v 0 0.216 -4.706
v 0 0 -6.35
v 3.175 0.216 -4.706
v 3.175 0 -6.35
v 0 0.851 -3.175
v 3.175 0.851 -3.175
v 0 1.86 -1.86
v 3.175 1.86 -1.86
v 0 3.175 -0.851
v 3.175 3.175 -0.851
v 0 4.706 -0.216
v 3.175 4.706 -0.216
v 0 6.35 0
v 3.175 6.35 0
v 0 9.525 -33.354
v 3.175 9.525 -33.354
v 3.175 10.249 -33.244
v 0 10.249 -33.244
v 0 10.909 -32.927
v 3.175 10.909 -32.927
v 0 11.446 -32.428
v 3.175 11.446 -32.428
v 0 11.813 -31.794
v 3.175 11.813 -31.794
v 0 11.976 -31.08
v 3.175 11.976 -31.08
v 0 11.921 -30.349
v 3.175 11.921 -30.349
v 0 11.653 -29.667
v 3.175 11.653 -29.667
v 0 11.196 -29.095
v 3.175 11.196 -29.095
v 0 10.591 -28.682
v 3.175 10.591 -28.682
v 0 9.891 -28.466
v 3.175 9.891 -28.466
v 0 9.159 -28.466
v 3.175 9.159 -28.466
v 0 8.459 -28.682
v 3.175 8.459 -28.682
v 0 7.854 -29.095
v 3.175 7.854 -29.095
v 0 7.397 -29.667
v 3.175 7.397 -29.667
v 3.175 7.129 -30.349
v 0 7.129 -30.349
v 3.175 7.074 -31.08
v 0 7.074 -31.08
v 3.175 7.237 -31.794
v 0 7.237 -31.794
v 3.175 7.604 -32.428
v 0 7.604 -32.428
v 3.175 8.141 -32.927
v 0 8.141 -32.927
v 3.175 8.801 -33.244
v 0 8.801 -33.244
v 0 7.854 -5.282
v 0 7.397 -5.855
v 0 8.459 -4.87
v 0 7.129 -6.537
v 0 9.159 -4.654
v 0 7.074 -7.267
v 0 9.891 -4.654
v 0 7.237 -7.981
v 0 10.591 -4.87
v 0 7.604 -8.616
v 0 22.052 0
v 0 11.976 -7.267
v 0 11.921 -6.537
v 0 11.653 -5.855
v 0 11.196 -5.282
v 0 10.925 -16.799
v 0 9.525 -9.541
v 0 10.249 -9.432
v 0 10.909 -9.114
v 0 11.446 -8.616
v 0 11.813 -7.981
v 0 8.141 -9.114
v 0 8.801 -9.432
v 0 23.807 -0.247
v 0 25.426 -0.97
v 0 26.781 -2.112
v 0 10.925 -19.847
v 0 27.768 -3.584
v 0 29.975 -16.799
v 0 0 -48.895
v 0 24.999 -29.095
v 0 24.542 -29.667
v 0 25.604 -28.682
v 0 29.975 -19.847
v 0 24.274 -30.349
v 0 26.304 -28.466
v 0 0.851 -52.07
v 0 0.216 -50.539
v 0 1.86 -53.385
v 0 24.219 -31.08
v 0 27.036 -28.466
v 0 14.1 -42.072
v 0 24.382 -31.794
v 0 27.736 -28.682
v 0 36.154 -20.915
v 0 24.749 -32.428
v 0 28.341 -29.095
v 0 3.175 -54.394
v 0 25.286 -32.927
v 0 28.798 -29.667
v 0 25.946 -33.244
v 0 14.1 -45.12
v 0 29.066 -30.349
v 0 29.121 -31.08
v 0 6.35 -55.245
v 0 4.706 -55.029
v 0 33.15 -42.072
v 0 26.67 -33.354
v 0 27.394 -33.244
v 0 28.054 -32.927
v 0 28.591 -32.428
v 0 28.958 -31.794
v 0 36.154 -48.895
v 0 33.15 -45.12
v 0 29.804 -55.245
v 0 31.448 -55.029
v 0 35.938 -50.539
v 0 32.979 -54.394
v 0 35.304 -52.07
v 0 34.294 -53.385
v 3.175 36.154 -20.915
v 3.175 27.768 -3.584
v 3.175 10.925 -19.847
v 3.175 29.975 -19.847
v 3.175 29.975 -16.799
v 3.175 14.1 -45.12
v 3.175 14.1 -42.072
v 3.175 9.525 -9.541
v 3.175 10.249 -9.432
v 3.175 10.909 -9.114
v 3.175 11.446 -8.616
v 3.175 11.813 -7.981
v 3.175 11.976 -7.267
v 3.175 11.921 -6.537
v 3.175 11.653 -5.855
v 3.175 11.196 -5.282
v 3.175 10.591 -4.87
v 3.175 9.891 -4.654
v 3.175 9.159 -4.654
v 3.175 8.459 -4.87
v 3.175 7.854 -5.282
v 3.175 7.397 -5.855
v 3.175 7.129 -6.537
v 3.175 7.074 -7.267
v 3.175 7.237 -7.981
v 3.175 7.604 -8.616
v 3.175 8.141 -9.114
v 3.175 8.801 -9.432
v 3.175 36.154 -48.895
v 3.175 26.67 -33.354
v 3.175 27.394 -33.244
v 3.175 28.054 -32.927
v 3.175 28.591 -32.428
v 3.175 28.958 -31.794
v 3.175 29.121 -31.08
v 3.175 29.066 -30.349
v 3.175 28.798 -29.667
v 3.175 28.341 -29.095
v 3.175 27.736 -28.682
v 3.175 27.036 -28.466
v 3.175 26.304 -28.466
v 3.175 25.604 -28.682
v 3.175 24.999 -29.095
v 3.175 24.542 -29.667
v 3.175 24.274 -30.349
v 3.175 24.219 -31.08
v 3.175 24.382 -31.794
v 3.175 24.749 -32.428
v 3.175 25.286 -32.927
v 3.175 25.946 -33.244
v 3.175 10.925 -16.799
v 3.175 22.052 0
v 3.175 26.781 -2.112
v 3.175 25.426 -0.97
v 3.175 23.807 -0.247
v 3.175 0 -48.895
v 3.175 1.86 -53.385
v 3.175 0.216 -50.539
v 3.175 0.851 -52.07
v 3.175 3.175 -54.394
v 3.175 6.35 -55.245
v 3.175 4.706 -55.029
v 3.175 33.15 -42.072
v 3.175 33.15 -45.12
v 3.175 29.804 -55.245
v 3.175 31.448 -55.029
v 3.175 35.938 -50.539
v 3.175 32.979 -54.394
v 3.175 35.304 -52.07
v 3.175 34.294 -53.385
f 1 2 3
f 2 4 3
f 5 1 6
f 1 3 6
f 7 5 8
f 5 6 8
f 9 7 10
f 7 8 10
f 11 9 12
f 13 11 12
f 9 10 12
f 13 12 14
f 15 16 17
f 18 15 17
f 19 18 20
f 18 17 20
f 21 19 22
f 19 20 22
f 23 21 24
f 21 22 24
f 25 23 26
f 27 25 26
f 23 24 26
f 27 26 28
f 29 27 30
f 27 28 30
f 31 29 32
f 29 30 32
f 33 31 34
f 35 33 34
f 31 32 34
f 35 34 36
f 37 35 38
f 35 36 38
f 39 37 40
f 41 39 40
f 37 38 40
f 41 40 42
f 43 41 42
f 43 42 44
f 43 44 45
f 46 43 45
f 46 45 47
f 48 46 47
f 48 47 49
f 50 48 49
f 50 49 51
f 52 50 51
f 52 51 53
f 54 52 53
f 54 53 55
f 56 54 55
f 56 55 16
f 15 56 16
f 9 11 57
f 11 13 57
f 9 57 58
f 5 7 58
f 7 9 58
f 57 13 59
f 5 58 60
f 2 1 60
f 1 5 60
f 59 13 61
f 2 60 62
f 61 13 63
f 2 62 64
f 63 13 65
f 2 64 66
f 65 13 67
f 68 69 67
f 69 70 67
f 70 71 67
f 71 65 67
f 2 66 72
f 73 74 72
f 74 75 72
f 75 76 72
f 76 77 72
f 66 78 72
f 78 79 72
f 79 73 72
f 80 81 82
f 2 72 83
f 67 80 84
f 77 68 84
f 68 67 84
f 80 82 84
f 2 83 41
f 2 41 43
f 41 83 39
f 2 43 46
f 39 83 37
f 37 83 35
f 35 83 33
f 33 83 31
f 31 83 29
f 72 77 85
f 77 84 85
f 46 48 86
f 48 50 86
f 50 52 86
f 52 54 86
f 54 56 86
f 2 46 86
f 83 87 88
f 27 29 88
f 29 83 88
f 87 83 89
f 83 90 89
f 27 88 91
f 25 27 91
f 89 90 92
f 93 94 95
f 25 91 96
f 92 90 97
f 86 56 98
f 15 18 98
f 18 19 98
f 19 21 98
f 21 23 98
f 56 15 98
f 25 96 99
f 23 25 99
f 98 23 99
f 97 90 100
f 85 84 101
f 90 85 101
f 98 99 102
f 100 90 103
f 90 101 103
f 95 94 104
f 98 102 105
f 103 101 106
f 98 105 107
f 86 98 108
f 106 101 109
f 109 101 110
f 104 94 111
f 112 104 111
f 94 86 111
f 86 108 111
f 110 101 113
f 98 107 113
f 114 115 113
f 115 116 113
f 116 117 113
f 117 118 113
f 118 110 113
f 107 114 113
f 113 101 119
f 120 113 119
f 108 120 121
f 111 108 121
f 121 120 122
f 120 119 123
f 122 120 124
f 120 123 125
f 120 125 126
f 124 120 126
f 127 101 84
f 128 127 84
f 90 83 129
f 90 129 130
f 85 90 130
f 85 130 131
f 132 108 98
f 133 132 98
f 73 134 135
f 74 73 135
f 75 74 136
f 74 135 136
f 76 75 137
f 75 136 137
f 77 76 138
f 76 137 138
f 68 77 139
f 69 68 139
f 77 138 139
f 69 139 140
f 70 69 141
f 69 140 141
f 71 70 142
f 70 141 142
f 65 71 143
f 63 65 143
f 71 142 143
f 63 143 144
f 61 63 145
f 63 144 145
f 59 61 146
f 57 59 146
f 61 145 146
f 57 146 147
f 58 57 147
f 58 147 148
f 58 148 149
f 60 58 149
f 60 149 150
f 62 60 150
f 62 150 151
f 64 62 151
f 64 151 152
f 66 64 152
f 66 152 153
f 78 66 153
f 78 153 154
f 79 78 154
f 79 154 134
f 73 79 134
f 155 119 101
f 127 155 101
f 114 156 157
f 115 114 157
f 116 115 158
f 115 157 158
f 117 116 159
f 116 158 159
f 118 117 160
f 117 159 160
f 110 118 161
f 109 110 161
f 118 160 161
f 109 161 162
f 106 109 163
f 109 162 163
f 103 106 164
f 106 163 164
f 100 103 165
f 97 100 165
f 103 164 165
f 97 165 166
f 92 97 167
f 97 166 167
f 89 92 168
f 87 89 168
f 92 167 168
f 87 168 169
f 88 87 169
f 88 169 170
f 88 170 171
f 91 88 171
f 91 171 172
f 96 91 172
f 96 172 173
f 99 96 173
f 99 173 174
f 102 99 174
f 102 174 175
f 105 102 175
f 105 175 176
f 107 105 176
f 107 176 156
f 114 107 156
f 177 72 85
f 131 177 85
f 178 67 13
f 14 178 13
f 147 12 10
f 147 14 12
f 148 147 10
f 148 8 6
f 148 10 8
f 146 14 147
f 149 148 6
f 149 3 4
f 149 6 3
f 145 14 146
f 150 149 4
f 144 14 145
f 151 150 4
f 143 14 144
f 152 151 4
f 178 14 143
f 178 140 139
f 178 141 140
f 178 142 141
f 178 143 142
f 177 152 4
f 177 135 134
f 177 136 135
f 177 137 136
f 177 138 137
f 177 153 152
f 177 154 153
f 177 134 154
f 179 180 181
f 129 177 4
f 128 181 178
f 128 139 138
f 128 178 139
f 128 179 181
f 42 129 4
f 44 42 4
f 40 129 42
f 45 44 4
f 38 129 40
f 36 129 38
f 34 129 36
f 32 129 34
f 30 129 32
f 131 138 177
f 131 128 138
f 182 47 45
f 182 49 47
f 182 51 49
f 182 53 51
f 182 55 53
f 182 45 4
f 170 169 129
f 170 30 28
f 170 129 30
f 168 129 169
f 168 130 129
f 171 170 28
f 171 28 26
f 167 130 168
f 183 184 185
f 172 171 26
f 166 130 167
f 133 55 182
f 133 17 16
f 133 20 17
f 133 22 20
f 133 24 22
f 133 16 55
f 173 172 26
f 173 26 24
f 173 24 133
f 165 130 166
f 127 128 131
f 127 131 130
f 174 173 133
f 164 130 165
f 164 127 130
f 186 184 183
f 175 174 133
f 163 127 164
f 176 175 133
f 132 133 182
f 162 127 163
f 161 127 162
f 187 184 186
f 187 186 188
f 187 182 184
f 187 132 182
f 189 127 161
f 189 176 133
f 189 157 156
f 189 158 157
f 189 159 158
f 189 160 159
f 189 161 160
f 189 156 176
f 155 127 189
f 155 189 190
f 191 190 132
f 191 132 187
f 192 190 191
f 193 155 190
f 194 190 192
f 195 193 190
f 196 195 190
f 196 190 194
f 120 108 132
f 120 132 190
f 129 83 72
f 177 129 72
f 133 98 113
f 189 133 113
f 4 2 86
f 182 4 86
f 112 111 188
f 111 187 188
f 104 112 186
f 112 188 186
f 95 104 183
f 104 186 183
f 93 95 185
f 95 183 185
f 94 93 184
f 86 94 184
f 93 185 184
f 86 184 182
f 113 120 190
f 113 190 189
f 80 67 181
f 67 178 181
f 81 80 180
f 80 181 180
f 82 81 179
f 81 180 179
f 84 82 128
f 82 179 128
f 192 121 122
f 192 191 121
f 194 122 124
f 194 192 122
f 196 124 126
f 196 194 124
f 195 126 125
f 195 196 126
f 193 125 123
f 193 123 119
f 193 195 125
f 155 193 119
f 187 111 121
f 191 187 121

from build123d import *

# Parameters (mm, degrees)
BOSS_EXTRUDE1_DEPTH              = 3.175
SKETCH7_W                        = 3.048
SKETCH7_H                        = 19.05
CUT_EXTRUDE1_DEPTH               = 3.175
FILLET1_R                        = 6.35
F_10_0_1935_DIAMETER_HOLE2_D     = 4.9149
F_10_0_1935_DIAMETER_HOLE2_DEPTH = 9.699415072
F_10_0_1935_DIAMETER_HOLE2_TIP   = 1.476584928


with BuildPart() as part:
    # Sketch1 → Boss-Extrude1 (new body)
    with BuildSketch(Plane(origin=(0, 0, 0), x_dir=(0, 0, -1), z_dir=(1, 0, 0))):
        Polygon((55.245, 0), (55.245, 36.15436), (20.9147283, 36.15436), (0, 26.034021846), (0, 0), align=None)
    extrude(amount=BOSS_EXTRUDE1_DEPTH)

    # Sketch7 → Cut-Extrude1 (cut)
    with BuildSketch(Plane.ZY):
        with Locations((-43.596153092, 23.625208274)):
            Rectangle(SKETCH7_W, SKETCH7_H)
        with Locations((-18.323153092, 20.450208274)):
            Rectangle(SKETCH7_W, SKETCH7_H)
    extrude(amount=-CUT_EXTRUDE1_DEPTH, mode=Mode.SUBTRACT)

    # Fillet1
    fillet1_edges = [part.edges().sort_by_distance(p)[0] for p in [
        (1.5875, 0, 0),
        (1.5875, 26.034021846, 0),
        (1.5875, 36.15436, -55.245),
        (1.5875, 0, -55.245),
    ]]
    fillet(fillet1_edges, radius=FILLET1_R)

    # #10 (0.1935) Diameter Hole2
    with Locations(Plane.ZY):
        with Locations((-30.896153092, 9.525), (-30.896153092, 26.67), (-7.083653092, 9.525)):
            Hole(F_10_0_1935_DIAMETER_HOLE2_D / 2, depth=F_10_0_1935_DIAMETER_HOLE2_DEPTH)
            with Locations((0, 0, -(F_10_0_1935_DIAMETER_HOLE2_DEPTH + F_10_0_1935_DIAMETER_HOLE2_TIP / 2))):  # 118° drill point
                Cone(0, F_10_0_1935_DIAMETER_HOLE2_D / 2, F_10_0_1935_DIAMETER_HOLE2_TIP, mode=Mode.SUBTRACT)


solid = part.part
